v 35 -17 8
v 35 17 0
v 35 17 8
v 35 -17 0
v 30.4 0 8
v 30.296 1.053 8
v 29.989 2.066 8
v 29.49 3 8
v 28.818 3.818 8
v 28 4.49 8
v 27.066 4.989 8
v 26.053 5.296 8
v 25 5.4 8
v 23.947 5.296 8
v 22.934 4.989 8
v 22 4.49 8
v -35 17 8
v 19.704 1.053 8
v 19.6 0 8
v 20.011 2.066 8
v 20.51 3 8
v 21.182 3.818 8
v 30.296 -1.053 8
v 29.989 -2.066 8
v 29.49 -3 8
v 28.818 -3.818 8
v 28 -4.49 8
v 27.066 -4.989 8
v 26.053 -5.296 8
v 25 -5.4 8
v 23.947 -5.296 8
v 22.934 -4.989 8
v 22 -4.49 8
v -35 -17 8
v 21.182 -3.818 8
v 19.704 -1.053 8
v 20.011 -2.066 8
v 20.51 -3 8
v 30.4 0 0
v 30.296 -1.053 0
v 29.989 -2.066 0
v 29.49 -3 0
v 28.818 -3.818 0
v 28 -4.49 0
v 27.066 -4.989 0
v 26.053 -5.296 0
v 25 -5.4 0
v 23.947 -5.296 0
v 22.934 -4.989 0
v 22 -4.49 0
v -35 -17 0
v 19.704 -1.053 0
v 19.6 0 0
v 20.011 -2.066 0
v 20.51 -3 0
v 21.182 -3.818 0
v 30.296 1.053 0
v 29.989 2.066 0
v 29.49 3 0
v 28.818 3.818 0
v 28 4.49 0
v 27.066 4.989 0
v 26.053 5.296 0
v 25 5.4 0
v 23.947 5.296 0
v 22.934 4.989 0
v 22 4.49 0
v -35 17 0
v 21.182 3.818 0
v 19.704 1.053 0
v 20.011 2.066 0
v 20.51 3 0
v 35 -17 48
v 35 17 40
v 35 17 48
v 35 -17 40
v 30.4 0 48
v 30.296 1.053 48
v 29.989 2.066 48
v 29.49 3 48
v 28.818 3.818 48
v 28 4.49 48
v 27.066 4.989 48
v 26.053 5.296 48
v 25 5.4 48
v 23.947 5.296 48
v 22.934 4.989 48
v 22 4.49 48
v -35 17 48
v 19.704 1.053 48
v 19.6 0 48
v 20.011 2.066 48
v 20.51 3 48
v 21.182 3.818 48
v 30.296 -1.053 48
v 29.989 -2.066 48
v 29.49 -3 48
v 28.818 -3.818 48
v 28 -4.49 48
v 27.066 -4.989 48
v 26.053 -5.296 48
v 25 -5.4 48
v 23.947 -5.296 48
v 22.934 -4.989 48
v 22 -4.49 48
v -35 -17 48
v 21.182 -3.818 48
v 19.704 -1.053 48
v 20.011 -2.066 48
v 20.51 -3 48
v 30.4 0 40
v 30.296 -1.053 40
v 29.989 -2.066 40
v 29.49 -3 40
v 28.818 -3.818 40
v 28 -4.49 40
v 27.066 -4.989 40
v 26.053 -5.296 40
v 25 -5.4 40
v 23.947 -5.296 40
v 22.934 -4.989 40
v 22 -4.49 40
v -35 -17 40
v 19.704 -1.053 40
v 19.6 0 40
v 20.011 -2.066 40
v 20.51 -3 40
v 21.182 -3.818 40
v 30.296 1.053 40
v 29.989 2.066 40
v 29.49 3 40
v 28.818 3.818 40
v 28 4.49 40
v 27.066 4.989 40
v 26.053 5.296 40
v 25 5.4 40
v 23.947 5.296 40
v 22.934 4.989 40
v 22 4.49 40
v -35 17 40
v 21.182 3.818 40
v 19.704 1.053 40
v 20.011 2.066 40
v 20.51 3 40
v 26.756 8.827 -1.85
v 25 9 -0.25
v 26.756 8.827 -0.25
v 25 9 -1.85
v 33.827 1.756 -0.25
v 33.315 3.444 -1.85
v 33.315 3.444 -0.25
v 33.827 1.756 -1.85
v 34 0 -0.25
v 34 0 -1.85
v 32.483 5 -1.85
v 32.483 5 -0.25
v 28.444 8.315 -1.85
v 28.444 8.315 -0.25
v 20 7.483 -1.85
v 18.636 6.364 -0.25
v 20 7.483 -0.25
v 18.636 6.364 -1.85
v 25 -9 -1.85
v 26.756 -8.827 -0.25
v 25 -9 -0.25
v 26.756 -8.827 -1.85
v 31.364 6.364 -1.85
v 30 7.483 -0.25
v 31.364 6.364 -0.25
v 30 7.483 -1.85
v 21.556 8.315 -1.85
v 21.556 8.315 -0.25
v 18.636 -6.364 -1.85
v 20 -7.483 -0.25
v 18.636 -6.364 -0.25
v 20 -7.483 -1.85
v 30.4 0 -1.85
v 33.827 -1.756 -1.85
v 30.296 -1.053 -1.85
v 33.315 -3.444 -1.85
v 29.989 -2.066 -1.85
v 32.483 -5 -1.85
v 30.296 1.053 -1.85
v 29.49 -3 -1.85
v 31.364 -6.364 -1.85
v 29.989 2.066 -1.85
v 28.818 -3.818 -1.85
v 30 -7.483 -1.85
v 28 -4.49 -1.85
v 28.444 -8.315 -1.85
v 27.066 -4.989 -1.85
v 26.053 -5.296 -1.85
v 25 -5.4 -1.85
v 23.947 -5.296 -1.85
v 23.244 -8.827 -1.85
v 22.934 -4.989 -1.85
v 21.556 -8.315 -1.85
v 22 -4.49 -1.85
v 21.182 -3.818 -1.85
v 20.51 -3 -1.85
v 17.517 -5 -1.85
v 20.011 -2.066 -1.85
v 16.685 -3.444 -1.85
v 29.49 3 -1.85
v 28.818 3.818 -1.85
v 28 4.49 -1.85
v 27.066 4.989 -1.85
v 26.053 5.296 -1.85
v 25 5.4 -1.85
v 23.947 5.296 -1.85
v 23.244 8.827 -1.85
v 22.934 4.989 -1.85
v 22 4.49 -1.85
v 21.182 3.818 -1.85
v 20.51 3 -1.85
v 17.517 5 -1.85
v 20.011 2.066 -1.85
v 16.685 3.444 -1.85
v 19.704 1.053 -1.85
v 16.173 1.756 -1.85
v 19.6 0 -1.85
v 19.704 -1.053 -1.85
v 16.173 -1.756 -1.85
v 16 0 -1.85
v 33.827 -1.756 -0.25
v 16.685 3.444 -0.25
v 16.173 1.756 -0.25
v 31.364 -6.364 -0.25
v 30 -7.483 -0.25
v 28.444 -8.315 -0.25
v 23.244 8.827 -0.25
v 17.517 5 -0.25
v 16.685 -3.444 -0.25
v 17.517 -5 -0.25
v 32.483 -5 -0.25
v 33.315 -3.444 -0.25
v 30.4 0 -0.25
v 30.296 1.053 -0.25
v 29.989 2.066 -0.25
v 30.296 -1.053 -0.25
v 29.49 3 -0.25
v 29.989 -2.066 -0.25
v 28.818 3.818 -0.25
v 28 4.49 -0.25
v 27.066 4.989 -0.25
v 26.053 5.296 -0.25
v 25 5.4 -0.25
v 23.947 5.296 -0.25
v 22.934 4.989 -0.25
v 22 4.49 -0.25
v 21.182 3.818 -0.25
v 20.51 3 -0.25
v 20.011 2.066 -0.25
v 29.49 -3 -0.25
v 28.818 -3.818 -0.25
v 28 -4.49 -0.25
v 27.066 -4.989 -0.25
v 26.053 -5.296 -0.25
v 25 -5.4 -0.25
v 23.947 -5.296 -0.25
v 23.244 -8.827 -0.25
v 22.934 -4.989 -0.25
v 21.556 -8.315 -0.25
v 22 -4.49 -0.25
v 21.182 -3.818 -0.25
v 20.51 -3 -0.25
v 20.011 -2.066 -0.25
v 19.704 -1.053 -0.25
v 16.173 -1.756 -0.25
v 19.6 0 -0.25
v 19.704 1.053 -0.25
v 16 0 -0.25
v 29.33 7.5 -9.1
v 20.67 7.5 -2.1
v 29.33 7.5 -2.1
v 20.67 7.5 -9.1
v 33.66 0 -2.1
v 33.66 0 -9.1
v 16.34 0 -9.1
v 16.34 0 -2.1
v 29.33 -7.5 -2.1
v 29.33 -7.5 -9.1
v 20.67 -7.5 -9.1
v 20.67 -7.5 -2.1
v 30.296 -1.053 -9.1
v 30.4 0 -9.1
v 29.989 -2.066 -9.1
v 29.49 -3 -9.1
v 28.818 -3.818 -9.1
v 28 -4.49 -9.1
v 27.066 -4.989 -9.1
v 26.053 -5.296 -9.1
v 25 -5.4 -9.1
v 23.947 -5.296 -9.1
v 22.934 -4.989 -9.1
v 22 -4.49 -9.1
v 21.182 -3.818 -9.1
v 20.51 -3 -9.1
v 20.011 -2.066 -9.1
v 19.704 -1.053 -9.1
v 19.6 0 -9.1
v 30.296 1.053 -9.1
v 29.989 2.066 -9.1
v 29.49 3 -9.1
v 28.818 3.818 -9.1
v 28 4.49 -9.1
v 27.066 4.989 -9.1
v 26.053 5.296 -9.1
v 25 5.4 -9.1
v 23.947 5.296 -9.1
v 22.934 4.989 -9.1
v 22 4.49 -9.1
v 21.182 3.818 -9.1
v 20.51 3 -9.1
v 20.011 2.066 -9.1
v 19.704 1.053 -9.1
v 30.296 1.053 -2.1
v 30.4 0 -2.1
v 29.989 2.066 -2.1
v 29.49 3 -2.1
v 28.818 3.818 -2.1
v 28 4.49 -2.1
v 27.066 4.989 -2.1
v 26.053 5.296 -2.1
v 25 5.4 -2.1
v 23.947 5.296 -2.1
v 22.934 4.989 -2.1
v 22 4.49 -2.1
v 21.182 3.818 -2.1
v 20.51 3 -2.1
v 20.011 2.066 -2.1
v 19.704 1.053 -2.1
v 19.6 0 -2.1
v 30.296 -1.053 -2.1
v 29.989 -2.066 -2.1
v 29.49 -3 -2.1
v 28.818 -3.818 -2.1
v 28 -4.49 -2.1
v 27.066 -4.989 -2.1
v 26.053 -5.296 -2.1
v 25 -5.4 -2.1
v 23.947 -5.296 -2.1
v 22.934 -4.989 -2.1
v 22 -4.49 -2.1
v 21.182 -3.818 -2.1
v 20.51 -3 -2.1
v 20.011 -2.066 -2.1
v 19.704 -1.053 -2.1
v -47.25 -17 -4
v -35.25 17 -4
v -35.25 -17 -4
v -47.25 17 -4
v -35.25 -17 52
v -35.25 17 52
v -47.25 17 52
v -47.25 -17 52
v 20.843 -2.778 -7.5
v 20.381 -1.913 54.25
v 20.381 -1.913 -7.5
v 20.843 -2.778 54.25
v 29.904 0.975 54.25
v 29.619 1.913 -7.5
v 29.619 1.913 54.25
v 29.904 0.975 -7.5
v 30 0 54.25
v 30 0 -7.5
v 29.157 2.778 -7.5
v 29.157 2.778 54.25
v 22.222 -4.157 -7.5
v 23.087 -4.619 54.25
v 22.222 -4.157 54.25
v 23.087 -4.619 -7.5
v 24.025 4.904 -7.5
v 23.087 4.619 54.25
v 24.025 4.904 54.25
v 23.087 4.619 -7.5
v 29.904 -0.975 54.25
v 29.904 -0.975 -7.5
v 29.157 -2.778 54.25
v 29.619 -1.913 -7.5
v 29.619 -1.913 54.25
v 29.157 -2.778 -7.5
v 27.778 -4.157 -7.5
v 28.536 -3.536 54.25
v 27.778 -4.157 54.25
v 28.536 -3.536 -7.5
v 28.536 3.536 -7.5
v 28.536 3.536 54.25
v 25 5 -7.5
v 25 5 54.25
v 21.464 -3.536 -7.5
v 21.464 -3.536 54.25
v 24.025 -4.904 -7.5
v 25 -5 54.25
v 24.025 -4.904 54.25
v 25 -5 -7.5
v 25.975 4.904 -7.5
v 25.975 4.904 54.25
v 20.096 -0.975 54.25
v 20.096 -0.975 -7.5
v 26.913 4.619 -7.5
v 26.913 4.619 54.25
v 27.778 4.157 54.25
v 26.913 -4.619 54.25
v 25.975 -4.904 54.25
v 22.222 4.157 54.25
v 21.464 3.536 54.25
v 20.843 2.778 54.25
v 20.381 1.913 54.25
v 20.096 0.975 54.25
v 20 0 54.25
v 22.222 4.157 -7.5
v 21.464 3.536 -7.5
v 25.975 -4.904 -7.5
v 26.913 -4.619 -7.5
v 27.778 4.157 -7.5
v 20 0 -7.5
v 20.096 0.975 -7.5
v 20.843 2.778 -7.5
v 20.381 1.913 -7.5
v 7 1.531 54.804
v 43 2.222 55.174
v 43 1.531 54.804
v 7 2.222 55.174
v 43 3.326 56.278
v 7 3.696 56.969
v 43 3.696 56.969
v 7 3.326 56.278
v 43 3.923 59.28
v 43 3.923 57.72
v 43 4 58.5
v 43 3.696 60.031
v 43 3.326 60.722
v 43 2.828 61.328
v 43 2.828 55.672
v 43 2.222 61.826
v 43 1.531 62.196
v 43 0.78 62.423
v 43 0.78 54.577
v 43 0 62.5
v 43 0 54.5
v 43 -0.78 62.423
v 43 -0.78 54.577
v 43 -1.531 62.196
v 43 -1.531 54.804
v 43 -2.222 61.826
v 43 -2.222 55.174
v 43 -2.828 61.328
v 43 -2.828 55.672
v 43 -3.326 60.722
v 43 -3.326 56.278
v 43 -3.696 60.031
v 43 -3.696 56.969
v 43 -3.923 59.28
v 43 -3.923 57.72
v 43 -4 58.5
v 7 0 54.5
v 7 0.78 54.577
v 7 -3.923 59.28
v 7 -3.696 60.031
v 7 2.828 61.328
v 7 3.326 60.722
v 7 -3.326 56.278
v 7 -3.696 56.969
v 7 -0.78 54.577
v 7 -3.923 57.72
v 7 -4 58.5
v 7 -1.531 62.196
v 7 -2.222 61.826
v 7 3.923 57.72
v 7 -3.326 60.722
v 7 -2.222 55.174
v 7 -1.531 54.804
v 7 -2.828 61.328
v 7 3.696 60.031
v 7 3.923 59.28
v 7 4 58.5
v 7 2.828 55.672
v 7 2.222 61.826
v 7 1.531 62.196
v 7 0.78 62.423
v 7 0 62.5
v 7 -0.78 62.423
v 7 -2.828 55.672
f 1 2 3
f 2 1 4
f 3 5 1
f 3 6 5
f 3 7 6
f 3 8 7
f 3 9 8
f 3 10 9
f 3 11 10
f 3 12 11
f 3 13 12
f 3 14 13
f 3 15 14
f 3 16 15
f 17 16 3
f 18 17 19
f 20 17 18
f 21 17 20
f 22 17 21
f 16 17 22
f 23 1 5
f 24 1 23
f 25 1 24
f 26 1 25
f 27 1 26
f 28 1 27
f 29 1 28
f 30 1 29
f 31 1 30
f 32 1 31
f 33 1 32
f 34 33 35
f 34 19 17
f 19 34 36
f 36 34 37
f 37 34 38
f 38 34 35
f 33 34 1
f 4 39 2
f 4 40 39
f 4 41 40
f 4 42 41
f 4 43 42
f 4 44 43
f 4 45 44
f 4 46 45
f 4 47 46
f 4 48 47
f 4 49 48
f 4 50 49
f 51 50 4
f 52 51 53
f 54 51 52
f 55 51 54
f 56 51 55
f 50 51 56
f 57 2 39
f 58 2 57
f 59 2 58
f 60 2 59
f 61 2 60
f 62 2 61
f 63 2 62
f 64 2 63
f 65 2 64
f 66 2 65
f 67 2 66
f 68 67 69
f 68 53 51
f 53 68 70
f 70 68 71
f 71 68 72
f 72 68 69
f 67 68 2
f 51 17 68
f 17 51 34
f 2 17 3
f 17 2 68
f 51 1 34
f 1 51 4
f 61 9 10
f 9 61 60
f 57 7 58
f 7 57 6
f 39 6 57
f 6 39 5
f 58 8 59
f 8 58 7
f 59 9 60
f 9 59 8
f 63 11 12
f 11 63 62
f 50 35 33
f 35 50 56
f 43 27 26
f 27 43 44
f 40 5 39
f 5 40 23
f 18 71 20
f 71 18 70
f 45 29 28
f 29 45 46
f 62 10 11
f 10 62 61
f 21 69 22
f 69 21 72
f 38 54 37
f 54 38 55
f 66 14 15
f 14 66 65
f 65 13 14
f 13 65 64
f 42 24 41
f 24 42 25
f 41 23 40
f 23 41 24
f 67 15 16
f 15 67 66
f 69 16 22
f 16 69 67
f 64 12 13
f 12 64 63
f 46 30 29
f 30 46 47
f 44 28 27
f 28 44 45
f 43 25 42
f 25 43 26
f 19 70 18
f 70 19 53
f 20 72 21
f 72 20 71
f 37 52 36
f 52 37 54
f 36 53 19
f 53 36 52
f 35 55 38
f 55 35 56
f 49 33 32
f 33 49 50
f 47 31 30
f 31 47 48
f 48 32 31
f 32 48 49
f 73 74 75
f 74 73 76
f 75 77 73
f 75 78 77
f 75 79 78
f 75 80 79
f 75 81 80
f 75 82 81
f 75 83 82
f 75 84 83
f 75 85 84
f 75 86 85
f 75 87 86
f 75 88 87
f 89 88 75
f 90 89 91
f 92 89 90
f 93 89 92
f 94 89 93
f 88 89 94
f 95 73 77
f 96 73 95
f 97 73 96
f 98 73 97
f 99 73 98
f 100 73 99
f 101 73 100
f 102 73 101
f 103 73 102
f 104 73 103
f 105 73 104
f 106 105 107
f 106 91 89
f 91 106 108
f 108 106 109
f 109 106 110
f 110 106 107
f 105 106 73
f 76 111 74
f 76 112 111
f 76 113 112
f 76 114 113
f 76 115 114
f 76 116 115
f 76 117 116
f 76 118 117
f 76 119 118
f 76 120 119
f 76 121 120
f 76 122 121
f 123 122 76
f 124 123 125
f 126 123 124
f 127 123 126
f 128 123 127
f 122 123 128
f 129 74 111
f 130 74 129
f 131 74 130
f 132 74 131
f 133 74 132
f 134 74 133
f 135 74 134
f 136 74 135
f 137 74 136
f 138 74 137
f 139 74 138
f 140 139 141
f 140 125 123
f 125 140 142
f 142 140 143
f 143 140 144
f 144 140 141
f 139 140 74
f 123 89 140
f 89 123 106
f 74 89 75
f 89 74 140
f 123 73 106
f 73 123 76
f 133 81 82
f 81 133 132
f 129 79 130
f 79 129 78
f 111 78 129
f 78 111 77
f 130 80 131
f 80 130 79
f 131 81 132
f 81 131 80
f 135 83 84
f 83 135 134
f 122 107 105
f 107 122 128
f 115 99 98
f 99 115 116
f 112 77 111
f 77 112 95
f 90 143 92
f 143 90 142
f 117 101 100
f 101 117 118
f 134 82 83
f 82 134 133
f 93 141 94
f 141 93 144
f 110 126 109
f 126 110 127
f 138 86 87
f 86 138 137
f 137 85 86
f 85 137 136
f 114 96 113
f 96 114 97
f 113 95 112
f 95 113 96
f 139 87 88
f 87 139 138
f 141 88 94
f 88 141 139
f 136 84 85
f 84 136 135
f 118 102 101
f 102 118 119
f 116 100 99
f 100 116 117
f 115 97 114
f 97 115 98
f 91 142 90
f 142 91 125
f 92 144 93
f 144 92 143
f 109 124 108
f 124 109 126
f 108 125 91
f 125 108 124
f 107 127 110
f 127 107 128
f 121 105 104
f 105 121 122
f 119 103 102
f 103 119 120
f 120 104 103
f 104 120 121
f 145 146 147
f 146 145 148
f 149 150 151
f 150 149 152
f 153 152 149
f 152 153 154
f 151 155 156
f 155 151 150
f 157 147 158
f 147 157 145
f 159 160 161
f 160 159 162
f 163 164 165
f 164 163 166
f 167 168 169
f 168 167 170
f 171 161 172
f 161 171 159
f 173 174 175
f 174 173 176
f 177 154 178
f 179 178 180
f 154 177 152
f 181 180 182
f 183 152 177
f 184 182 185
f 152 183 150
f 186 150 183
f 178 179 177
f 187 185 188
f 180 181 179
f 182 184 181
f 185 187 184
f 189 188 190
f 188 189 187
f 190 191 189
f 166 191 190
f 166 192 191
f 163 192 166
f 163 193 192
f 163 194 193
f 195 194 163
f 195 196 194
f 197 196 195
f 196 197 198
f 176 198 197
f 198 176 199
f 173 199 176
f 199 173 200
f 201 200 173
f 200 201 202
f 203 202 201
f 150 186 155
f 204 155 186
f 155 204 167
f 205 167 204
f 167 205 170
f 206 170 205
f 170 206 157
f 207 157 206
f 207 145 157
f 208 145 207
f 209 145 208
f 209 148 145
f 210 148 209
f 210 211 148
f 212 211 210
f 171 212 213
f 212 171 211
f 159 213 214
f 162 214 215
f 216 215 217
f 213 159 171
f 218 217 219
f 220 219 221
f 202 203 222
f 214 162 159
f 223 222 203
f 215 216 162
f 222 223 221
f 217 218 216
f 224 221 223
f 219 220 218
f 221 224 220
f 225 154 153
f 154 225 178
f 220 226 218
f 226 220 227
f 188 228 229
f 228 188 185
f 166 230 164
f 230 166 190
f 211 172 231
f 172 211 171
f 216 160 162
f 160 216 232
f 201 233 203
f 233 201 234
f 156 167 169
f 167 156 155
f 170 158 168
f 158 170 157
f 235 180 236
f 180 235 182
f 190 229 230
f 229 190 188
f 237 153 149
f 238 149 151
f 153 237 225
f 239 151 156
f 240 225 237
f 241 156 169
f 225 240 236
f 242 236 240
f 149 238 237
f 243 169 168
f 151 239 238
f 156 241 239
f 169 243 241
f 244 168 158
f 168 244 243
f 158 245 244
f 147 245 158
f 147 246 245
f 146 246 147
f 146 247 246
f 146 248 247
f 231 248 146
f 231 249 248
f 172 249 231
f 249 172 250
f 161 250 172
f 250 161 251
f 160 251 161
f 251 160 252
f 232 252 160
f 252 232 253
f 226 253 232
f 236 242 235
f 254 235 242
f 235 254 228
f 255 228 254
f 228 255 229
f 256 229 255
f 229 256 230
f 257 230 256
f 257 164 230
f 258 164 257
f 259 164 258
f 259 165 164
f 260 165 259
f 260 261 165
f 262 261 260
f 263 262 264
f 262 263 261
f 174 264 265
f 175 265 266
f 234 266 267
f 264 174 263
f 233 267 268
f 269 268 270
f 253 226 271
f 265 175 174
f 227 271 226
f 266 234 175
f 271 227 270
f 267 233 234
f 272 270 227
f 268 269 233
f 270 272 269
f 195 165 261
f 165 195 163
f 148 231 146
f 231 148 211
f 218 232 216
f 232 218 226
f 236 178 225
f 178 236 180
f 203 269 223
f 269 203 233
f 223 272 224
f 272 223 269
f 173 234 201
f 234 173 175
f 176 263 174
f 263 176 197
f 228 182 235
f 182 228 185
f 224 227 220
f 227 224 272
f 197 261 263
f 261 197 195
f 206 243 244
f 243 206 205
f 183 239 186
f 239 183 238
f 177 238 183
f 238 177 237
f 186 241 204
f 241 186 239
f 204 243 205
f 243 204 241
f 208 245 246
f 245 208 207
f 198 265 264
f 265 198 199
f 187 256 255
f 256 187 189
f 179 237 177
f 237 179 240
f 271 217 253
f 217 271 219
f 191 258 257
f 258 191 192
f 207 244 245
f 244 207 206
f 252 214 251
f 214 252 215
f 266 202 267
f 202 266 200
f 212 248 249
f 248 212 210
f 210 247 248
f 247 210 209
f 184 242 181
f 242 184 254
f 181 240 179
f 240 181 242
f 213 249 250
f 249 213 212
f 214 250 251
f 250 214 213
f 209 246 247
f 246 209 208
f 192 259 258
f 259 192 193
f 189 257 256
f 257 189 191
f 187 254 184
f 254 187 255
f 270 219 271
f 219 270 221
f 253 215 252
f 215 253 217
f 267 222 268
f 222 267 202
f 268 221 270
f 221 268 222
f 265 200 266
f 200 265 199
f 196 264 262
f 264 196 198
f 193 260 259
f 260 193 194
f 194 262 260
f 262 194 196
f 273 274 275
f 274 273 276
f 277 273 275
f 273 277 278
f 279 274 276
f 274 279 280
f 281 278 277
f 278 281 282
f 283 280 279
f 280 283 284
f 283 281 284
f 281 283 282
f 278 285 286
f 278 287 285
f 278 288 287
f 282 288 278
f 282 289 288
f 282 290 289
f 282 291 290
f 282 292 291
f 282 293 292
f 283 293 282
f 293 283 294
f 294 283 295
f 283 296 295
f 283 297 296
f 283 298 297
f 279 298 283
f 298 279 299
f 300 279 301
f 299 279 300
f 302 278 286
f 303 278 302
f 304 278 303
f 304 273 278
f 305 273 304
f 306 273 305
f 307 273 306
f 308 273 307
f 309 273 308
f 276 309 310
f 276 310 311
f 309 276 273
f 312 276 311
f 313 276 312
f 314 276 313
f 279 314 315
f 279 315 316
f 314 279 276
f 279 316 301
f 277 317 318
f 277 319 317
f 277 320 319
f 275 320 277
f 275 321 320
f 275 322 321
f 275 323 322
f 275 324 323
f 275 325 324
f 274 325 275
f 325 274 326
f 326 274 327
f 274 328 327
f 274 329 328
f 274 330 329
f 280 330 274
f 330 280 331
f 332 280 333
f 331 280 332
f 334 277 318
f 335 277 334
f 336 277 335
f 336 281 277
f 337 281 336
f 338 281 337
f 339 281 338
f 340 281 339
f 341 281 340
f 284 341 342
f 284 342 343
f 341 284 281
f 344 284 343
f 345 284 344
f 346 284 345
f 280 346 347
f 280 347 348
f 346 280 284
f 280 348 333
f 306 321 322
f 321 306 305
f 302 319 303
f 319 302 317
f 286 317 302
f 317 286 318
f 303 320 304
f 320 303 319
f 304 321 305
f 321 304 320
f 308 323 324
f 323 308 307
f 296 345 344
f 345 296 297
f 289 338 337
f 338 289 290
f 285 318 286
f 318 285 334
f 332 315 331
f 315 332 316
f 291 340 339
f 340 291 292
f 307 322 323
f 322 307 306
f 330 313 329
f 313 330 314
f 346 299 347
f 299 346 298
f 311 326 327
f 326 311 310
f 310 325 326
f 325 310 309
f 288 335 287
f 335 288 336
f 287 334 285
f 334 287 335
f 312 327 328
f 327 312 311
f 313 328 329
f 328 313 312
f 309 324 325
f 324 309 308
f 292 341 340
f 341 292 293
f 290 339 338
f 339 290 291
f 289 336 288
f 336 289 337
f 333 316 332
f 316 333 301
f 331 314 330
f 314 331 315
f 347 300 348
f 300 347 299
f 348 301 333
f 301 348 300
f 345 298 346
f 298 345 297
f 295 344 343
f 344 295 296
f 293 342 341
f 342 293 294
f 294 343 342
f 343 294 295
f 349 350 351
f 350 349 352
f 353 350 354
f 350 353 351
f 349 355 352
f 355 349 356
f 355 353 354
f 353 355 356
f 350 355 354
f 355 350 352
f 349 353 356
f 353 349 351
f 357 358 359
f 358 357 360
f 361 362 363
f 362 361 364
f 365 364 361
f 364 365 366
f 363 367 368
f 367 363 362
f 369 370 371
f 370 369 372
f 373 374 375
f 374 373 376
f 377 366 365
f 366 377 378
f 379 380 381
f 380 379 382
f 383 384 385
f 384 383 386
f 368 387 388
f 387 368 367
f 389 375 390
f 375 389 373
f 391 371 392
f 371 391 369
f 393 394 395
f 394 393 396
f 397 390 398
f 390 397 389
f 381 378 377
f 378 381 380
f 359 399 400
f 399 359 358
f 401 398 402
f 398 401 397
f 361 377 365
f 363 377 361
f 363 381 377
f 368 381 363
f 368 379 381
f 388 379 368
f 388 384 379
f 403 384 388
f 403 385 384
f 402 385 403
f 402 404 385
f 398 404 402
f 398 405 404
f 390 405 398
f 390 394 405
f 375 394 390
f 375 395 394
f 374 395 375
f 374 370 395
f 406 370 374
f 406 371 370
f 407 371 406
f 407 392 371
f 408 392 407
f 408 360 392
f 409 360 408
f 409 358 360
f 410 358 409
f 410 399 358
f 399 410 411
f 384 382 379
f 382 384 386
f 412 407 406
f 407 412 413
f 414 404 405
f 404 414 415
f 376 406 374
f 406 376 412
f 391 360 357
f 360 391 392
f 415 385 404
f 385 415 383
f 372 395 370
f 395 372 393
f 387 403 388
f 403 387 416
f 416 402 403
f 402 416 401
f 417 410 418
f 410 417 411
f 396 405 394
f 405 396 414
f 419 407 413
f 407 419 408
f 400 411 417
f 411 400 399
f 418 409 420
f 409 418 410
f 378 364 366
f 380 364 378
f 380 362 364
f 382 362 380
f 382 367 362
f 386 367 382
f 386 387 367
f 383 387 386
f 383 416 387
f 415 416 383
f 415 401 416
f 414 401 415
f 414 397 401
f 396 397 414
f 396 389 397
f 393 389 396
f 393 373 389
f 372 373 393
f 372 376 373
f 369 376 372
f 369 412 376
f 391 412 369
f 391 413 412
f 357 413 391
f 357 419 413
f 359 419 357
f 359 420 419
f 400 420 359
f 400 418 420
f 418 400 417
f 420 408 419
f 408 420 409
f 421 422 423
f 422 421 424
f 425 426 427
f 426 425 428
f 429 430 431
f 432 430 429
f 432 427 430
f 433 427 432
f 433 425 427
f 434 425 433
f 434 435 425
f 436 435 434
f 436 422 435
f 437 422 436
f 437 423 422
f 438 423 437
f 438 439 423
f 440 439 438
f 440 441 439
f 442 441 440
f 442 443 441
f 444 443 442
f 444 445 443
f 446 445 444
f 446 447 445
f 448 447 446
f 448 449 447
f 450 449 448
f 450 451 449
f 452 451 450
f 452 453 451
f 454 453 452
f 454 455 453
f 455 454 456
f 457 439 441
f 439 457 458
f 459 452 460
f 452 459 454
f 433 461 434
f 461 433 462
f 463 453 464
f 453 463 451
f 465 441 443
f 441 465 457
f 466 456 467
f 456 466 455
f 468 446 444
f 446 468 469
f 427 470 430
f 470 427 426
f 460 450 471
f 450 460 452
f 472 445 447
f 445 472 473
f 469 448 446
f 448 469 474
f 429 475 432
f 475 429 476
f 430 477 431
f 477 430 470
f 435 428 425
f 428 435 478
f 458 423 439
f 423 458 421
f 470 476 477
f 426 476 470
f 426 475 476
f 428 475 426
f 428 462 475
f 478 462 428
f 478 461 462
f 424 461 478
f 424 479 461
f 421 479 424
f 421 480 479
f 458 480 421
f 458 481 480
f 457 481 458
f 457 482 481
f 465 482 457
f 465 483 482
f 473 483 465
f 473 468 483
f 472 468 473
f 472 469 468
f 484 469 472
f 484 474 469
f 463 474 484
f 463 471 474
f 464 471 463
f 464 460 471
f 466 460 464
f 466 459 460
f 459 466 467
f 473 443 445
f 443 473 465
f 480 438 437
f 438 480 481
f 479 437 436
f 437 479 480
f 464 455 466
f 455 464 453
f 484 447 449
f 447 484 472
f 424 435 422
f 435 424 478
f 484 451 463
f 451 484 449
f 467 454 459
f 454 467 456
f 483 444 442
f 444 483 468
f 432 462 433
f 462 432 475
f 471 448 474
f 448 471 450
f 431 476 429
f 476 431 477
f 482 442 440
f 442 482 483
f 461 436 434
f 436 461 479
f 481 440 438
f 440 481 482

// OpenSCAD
$fn = 32;

// ------------------------------------------------------------------------
// C clamp: throat 40 mm, screw d10
// Every part is its own module, assembly() places every instance.
// ------------------------------------------------------------------------

// --- part 1 ---
module clamp_arm() {
  difference() {
    translate([-35, -17, 0]) cube([70, 34, 8]);
    translate([25, 0, -1]) cylinder(h = 10, d = 10.8);
  }
}

// --- part 2 ---
module clamp_spine() {
  difference() {
    translate([-28, -17, 0]) cube([56, 34, 12]);
  }
}

// --- part 3 ---
module clamp_screw() {
  translate([0, 0, -30.875]) cylinder(h = 61.75, d = 10);
}

// --- part 4 ---
module clamp_washer() {
  difference() {
      translate([0, 0, 0]) cylinder(h = 1.6, d = 18);
      translate([0, 0, -1]) cylinder(h = 3.6, d = 10.8);
    }
}

// --- part 5 ---
module clamp_nut() {
  difference() {
    linear_extrude(height = 7) polygon(points = [[8.66, 0], [4.33, 7.5], [-4.33, 7.5], [-8.66, 0], [-4.33, -7.5], [4.33, -7.5]]);
    translate([0, 0, -1]) cylinder(h = 9, d = 10.8);
  }
}

// --- part 6 ---
module tommy_bar() {
  translate([0, 0, -18]) cylinder(h = 36, d = 8);
}

// --- assembly ---
module assembly() {
  color([0.80, 0.24, 0.20]) translate([0, 0, 0]) rotate([0, 0, 0]) clamp_arm();
  color([0.20, 0.45, 0.75]) translate([0, 0, 40]) rotate([0, 0, 0]) clamp_arm();
  color([0.25, 0.62, 0.32]) translate([-47.25, 0, 24]) rotate([0, 90, 0]) clamp_spine();
  color([0.92, 0.70, 0.18]) translate([25, 0, 23.375]) rotate([0, 0, 0]) clamp_screw();
  color([0.58, 0.35, 0.70]) translate([25, 0, -1.85]) rotate([0, 0, 0]) clamp_washer();
  color([0.16, 0.66, 0.66]) translate([25, 0, -9.1]) rotate([0, 0, 0]) clamp_nut();
  color([0.85, 0.48, 0.18]) translate([25, 0, 58.5]) rotate([0, 90, 0]) tommy_bar();
}

assembly();
